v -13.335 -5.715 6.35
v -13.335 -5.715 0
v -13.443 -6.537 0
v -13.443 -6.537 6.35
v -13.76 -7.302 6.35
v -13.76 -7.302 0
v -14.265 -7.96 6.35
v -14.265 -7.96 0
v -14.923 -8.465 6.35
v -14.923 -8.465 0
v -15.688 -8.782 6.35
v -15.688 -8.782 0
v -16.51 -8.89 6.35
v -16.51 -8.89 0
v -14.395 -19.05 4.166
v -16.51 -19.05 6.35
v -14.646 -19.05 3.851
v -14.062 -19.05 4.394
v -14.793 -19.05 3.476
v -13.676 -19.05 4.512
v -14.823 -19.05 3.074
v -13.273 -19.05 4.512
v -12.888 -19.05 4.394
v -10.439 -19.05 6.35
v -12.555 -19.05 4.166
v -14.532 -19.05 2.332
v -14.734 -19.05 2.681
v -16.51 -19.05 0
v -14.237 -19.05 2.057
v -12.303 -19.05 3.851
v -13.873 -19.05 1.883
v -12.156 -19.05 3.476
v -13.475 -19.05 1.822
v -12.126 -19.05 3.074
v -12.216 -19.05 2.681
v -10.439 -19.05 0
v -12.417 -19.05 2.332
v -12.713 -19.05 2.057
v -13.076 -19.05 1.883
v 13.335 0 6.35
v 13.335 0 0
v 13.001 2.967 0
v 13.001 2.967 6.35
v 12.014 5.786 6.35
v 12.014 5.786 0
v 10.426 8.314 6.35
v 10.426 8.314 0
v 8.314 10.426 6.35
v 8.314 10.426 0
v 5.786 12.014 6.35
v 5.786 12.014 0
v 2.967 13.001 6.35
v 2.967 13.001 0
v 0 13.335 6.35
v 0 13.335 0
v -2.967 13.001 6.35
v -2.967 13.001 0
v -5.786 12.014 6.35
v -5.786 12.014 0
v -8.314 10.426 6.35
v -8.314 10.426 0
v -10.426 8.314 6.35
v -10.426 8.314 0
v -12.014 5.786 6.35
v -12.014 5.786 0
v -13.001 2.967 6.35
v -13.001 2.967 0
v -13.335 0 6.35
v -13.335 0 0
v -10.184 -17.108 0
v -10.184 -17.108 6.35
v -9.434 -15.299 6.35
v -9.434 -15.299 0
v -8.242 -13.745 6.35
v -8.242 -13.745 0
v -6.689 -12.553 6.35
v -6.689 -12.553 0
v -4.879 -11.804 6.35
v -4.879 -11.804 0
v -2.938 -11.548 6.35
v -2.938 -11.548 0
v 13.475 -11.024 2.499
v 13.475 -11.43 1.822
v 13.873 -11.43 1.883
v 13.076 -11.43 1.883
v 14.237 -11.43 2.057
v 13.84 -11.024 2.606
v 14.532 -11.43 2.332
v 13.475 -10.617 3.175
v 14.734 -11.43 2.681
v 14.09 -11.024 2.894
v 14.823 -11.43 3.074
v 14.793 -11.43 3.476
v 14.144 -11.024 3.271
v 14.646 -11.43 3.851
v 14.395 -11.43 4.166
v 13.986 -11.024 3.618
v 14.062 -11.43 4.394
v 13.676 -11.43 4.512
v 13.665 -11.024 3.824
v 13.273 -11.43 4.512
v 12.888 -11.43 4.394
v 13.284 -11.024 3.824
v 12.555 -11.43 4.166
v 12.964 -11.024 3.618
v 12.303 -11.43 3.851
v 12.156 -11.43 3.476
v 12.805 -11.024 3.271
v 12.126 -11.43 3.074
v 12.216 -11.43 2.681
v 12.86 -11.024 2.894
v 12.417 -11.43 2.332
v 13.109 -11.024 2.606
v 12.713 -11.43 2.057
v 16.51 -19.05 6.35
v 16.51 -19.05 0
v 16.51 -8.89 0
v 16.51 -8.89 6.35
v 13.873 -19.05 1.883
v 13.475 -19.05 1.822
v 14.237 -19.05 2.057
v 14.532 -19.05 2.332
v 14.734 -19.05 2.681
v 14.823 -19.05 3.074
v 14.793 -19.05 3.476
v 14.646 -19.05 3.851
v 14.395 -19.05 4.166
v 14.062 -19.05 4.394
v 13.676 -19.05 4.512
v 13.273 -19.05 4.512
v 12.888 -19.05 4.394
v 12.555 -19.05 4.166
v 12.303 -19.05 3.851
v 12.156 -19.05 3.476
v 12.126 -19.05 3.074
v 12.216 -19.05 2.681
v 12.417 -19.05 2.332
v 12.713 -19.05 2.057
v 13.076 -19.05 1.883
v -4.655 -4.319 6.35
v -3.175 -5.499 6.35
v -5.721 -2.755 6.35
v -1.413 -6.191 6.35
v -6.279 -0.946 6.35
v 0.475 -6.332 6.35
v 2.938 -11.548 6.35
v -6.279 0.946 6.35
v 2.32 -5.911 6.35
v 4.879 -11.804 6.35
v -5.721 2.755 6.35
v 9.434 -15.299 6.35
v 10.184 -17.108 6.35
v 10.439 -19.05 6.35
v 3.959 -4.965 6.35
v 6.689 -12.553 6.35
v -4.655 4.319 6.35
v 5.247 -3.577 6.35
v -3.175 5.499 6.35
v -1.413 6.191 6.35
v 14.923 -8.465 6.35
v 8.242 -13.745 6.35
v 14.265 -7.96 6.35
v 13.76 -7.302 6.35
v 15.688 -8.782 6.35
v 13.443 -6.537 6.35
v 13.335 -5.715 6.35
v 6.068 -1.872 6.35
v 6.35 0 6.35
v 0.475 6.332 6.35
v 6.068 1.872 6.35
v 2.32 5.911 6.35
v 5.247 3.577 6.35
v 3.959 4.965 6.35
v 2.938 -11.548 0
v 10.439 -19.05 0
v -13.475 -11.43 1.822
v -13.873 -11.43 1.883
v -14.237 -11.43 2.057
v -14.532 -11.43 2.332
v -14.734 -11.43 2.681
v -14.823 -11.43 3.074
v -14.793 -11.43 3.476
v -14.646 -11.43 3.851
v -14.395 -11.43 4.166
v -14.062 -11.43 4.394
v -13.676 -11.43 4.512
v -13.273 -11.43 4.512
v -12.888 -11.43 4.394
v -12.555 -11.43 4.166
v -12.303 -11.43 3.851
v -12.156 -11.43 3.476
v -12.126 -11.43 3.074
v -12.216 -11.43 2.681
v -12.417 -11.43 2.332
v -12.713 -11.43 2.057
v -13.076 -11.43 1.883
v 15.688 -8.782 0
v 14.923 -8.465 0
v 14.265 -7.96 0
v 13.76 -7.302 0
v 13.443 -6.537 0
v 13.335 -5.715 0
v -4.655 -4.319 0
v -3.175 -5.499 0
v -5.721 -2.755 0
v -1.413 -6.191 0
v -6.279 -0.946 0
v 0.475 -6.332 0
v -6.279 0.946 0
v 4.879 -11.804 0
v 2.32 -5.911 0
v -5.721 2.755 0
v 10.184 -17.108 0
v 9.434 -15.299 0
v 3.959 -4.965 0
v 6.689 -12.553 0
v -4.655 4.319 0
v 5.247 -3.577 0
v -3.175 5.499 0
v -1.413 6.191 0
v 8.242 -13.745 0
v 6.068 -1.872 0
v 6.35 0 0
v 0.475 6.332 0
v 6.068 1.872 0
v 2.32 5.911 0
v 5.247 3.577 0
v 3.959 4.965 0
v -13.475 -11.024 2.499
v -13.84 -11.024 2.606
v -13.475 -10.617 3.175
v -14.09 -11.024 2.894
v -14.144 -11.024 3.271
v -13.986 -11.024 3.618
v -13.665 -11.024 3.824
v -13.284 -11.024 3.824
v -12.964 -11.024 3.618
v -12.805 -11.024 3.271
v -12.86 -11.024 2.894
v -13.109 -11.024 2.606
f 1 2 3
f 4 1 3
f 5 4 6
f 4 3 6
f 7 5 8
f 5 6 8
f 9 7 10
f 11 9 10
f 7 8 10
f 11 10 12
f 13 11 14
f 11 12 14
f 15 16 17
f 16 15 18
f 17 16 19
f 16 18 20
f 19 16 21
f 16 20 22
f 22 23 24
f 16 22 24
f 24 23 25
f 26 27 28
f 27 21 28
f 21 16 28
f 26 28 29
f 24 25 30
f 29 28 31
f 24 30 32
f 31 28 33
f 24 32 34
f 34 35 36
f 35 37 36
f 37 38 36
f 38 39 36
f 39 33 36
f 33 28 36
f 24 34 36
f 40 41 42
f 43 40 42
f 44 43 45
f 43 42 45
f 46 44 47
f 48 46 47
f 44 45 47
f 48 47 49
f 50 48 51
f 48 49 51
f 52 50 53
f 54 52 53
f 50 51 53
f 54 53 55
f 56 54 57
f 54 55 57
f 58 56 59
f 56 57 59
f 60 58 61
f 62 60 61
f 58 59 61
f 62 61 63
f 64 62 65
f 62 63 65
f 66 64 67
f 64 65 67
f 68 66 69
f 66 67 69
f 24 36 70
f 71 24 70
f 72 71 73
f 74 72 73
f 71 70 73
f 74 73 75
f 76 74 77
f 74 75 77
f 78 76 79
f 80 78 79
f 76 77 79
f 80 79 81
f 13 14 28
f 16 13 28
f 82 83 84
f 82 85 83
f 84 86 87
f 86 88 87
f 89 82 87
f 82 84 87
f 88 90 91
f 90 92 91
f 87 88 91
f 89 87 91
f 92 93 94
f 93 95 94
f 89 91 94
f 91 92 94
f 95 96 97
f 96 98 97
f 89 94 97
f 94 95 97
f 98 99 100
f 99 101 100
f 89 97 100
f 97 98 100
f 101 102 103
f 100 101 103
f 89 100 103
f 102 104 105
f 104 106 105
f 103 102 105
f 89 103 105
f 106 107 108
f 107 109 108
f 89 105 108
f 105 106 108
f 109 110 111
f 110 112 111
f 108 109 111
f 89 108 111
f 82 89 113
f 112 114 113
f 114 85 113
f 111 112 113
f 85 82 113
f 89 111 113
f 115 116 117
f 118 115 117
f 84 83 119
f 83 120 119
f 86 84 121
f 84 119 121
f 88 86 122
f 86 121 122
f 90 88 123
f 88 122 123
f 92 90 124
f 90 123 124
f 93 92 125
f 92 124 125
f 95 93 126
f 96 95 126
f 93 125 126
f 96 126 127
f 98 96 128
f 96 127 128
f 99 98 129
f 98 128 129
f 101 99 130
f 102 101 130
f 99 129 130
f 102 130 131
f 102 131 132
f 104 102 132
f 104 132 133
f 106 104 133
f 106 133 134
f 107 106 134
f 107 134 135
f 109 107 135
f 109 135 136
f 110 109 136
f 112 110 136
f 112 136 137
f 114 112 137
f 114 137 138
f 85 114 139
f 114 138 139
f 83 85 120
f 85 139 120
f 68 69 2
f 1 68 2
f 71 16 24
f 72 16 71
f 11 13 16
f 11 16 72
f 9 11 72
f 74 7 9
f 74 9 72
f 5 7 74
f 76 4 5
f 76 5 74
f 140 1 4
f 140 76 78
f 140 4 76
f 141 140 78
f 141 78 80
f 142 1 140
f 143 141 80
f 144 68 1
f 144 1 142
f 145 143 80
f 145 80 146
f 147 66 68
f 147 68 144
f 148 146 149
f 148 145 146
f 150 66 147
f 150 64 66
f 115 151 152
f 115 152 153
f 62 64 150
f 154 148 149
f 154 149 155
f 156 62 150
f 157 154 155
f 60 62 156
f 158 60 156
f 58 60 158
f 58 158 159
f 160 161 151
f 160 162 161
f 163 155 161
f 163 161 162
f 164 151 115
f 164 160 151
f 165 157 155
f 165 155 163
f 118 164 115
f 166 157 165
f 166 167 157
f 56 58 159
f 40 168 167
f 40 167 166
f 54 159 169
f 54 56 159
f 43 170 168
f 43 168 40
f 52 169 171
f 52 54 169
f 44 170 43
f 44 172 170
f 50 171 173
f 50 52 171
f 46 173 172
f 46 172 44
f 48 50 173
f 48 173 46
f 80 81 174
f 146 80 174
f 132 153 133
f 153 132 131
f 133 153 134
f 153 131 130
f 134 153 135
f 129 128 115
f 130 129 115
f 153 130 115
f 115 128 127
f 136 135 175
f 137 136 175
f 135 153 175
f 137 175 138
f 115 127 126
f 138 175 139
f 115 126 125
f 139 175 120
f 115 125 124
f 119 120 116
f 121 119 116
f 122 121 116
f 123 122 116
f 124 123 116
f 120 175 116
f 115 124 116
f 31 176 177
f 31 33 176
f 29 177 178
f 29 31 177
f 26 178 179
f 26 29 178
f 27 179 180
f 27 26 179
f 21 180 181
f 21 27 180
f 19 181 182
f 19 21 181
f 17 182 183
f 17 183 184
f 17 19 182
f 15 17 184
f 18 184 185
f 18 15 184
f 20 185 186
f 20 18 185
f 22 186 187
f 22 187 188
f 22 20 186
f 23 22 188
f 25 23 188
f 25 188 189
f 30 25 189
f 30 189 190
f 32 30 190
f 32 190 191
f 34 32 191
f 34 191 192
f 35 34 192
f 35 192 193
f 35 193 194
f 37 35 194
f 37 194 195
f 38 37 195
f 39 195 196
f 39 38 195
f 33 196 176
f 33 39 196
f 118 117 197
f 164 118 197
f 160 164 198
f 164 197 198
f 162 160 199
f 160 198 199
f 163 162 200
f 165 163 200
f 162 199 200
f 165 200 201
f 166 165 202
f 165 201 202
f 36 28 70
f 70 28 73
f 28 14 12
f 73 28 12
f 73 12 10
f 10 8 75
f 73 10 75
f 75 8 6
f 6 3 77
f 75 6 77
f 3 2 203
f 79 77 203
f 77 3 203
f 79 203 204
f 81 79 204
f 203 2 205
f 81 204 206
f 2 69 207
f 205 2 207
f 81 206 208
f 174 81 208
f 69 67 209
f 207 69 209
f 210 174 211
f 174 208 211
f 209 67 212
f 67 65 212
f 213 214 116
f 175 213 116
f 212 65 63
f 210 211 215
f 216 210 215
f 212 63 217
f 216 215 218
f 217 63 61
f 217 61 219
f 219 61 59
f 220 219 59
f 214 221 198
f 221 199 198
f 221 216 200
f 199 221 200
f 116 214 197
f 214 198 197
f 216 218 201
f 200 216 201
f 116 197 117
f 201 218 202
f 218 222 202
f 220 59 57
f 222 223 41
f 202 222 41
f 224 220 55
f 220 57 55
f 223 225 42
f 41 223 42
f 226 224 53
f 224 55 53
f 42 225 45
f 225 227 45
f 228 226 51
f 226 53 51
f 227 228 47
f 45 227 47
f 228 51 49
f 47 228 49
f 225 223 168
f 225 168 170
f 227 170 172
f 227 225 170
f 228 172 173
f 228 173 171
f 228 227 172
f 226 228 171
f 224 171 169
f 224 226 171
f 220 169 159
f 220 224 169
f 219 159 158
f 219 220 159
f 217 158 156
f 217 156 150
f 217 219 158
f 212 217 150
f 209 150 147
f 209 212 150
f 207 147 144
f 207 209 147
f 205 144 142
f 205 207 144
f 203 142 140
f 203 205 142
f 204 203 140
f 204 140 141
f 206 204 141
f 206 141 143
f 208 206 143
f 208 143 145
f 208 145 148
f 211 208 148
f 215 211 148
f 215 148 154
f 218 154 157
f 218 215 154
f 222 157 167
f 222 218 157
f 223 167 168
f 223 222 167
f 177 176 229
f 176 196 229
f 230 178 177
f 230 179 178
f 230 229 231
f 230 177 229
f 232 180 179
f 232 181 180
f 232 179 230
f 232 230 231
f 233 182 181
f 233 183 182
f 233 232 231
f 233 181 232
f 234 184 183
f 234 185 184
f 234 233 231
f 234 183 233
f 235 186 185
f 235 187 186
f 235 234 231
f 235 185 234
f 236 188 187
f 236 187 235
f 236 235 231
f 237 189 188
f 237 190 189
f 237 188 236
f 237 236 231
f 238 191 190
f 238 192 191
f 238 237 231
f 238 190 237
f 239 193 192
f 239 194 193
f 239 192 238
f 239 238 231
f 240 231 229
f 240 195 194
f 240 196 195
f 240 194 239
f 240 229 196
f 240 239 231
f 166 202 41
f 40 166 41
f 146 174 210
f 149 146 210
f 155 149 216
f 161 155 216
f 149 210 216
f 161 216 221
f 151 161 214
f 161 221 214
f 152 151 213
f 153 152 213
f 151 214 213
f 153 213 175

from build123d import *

# Parameters (mm, degrees)
SKETCH1_R           = 6.35
BOSS_EXTRUDE1_DEPTH = 6.35


with BuildPart() as part:
    # Sketch1 → Boss-Extrude1 (new body)
    with BuildSketch(Plane.XY):
        with BuildLine():
            Line((-13.335, 0), (-13.335, -5.715))
            ThreePointArc((-13.335, -5.715), (-14.26493597, -7.96006403), (-16.51, -8.89))
            Line((-16.51, -8.89), (-16.51, -19.05))
            Line((-16.51, -19.05), (-10.4394, -19.05))
            ThreePointArc((-10.4394, -19.05), (-8.242182532, -13.745447789), (-2.93763032, -11.54823032))
            Line((-2.93763032, -11.54823032), (2.93763032, -11.54823032))
            ThreePointArc((2.93763032, -11.54823032), (8.242182532, -13.745447789), (10.4394, -19.05))
            Line((10.4394, -19.05), (16.51, -19.05))
            Line((16.51, -19.05), (16.51, -8.89))
            ThreePointArc((16.51, -8.89), (14.26493597, -7.96006403), (13.335, -5.715))
            Line((13.335, -5.715), (13.335, 0))
            ThreePointArc((13.335, 0), (0, 13.335), (-13.335, 0))
        make_face()
        Circle(SKETCH1_R, mode=Mode.SUBTRACT)
    extrude(amount=BOSS_EXTRUDE1_DEPTH)

    # Sketch2 → Tap Drill for #6-32 Tap1 (revolve, cut)
    with BuildSketch(Plane(origin=(-13.4747, -19.05, 3.175), x_dir=(0, 0, -1), z_dir=(1, 0, 0))):
        Polygon((0, 0), (0, 8.43269403), (1.35255, 7.62), (1.35255, 0), align=None)
    tap_drill_for_6_32_tap1 = revolve(axis=Axis((-13.4747, -25.4, 3.175), (0, 1, 0)), mode=Mode.SUBTRACT)

    # Mirror1: Tap Drill for #6-32 Tap1 across plane
    add(tap_drill_for_6_32_tap1.mirror(Plane(origin=(0, 0, 0), x_dir=(0, 0, 1), z_dir=(1, 0, 0))), mode=Mode.SUBTRACT)


solid = part.part
